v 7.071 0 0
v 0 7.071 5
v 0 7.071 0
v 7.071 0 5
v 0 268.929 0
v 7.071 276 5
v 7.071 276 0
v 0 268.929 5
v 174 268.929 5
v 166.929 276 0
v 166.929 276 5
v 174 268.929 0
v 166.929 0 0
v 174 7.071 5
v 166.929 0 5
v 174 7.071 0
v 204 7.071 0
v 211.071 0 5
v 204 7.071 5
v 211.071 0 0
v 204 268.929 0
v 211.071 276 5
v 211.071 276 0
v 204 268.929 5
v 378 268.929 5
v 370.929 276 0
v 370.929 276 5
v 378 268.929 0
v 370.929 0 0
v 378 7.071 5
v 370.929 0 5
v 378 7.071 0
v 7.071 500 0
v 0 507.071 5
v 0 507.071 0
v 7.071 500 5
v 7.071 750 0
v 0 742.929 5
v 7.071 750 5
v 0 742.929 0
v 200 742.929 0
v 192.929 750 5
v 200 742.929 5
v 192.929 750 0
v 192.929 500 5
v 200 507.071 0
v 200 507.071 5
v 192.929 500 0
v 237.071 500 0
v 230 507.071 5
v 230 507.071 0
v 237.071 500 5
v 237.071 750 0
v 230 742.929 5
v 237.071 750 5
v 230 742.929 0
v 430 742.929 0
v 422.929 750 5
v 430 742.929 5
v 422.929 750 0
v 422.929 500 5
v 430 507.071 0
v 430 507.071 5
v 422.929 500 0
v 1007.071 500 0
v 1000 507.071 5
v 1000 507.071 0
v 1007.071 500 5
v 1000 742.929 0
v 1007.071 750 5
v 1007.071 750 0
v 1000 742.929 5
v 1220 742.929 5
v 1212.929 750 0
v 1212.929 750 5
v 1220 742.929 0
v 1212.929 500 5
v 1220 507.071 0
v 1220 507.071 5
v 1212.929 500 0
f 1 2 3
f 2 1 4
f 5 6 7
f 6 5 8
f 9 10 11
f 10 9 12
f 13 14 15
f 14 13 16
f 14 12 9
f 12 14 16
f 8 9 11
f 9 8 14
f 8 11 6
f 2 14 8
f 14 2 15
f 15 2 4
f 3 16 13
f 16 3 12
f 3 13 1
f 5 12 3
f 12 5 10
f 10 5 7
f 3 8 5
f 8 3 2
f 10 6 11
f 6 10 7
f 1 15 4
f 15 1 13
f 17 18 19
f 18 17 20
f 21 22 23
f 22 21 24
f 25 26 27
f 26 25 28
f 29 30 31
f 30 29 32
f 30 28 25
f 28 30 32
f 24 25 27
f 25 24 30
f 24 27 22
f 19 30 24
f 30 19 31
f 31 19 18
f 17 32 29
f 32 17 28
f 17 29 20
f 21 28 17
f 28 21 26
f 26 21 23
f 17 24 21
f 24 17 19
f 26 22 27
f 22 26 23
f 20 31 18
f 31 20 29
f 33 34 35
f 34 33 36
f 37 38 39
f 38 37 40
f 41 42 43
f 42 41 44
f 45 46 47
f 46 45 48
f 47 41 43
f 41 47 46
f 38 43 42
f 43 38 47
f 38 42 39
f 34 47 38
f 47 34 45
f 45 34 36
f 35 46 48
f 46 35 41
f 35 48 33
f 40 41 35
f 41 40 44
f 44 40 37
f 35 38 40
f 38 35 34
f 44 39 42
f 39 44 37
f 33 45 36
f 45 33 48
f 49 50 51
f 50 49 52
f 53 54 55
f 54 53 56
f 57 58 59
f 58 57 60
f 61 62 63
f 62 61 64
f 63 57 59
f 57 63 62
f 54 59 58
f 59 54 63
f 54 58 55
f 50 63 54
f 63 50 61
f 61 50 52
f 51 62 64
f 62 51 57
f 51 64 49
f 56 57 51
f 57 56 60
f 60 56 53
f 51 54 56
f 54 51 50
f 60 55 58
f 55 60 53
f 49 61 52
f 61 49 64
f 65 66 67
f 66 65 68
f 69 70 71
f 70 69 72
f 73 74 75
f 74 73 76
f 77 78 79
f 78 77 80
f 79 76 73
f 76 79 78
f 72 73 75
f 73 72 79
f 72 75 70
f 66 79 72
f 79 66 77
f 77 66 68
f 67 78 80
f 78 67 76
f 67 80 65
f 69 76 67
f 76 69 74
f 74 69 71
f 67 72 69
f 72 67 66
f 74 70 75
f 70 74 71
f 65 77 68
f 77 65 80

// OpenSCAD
include <../src/wardrobe.scad>;
cnc_slab_batch();
//github_openscad -o wardrobe_3/cnc_slab_batch.stl -D wardrobe_n=3 -D cutting_edge=0 -D break_view_length=0 wardrobe_3/cnc_slab_batch_stl.scad
